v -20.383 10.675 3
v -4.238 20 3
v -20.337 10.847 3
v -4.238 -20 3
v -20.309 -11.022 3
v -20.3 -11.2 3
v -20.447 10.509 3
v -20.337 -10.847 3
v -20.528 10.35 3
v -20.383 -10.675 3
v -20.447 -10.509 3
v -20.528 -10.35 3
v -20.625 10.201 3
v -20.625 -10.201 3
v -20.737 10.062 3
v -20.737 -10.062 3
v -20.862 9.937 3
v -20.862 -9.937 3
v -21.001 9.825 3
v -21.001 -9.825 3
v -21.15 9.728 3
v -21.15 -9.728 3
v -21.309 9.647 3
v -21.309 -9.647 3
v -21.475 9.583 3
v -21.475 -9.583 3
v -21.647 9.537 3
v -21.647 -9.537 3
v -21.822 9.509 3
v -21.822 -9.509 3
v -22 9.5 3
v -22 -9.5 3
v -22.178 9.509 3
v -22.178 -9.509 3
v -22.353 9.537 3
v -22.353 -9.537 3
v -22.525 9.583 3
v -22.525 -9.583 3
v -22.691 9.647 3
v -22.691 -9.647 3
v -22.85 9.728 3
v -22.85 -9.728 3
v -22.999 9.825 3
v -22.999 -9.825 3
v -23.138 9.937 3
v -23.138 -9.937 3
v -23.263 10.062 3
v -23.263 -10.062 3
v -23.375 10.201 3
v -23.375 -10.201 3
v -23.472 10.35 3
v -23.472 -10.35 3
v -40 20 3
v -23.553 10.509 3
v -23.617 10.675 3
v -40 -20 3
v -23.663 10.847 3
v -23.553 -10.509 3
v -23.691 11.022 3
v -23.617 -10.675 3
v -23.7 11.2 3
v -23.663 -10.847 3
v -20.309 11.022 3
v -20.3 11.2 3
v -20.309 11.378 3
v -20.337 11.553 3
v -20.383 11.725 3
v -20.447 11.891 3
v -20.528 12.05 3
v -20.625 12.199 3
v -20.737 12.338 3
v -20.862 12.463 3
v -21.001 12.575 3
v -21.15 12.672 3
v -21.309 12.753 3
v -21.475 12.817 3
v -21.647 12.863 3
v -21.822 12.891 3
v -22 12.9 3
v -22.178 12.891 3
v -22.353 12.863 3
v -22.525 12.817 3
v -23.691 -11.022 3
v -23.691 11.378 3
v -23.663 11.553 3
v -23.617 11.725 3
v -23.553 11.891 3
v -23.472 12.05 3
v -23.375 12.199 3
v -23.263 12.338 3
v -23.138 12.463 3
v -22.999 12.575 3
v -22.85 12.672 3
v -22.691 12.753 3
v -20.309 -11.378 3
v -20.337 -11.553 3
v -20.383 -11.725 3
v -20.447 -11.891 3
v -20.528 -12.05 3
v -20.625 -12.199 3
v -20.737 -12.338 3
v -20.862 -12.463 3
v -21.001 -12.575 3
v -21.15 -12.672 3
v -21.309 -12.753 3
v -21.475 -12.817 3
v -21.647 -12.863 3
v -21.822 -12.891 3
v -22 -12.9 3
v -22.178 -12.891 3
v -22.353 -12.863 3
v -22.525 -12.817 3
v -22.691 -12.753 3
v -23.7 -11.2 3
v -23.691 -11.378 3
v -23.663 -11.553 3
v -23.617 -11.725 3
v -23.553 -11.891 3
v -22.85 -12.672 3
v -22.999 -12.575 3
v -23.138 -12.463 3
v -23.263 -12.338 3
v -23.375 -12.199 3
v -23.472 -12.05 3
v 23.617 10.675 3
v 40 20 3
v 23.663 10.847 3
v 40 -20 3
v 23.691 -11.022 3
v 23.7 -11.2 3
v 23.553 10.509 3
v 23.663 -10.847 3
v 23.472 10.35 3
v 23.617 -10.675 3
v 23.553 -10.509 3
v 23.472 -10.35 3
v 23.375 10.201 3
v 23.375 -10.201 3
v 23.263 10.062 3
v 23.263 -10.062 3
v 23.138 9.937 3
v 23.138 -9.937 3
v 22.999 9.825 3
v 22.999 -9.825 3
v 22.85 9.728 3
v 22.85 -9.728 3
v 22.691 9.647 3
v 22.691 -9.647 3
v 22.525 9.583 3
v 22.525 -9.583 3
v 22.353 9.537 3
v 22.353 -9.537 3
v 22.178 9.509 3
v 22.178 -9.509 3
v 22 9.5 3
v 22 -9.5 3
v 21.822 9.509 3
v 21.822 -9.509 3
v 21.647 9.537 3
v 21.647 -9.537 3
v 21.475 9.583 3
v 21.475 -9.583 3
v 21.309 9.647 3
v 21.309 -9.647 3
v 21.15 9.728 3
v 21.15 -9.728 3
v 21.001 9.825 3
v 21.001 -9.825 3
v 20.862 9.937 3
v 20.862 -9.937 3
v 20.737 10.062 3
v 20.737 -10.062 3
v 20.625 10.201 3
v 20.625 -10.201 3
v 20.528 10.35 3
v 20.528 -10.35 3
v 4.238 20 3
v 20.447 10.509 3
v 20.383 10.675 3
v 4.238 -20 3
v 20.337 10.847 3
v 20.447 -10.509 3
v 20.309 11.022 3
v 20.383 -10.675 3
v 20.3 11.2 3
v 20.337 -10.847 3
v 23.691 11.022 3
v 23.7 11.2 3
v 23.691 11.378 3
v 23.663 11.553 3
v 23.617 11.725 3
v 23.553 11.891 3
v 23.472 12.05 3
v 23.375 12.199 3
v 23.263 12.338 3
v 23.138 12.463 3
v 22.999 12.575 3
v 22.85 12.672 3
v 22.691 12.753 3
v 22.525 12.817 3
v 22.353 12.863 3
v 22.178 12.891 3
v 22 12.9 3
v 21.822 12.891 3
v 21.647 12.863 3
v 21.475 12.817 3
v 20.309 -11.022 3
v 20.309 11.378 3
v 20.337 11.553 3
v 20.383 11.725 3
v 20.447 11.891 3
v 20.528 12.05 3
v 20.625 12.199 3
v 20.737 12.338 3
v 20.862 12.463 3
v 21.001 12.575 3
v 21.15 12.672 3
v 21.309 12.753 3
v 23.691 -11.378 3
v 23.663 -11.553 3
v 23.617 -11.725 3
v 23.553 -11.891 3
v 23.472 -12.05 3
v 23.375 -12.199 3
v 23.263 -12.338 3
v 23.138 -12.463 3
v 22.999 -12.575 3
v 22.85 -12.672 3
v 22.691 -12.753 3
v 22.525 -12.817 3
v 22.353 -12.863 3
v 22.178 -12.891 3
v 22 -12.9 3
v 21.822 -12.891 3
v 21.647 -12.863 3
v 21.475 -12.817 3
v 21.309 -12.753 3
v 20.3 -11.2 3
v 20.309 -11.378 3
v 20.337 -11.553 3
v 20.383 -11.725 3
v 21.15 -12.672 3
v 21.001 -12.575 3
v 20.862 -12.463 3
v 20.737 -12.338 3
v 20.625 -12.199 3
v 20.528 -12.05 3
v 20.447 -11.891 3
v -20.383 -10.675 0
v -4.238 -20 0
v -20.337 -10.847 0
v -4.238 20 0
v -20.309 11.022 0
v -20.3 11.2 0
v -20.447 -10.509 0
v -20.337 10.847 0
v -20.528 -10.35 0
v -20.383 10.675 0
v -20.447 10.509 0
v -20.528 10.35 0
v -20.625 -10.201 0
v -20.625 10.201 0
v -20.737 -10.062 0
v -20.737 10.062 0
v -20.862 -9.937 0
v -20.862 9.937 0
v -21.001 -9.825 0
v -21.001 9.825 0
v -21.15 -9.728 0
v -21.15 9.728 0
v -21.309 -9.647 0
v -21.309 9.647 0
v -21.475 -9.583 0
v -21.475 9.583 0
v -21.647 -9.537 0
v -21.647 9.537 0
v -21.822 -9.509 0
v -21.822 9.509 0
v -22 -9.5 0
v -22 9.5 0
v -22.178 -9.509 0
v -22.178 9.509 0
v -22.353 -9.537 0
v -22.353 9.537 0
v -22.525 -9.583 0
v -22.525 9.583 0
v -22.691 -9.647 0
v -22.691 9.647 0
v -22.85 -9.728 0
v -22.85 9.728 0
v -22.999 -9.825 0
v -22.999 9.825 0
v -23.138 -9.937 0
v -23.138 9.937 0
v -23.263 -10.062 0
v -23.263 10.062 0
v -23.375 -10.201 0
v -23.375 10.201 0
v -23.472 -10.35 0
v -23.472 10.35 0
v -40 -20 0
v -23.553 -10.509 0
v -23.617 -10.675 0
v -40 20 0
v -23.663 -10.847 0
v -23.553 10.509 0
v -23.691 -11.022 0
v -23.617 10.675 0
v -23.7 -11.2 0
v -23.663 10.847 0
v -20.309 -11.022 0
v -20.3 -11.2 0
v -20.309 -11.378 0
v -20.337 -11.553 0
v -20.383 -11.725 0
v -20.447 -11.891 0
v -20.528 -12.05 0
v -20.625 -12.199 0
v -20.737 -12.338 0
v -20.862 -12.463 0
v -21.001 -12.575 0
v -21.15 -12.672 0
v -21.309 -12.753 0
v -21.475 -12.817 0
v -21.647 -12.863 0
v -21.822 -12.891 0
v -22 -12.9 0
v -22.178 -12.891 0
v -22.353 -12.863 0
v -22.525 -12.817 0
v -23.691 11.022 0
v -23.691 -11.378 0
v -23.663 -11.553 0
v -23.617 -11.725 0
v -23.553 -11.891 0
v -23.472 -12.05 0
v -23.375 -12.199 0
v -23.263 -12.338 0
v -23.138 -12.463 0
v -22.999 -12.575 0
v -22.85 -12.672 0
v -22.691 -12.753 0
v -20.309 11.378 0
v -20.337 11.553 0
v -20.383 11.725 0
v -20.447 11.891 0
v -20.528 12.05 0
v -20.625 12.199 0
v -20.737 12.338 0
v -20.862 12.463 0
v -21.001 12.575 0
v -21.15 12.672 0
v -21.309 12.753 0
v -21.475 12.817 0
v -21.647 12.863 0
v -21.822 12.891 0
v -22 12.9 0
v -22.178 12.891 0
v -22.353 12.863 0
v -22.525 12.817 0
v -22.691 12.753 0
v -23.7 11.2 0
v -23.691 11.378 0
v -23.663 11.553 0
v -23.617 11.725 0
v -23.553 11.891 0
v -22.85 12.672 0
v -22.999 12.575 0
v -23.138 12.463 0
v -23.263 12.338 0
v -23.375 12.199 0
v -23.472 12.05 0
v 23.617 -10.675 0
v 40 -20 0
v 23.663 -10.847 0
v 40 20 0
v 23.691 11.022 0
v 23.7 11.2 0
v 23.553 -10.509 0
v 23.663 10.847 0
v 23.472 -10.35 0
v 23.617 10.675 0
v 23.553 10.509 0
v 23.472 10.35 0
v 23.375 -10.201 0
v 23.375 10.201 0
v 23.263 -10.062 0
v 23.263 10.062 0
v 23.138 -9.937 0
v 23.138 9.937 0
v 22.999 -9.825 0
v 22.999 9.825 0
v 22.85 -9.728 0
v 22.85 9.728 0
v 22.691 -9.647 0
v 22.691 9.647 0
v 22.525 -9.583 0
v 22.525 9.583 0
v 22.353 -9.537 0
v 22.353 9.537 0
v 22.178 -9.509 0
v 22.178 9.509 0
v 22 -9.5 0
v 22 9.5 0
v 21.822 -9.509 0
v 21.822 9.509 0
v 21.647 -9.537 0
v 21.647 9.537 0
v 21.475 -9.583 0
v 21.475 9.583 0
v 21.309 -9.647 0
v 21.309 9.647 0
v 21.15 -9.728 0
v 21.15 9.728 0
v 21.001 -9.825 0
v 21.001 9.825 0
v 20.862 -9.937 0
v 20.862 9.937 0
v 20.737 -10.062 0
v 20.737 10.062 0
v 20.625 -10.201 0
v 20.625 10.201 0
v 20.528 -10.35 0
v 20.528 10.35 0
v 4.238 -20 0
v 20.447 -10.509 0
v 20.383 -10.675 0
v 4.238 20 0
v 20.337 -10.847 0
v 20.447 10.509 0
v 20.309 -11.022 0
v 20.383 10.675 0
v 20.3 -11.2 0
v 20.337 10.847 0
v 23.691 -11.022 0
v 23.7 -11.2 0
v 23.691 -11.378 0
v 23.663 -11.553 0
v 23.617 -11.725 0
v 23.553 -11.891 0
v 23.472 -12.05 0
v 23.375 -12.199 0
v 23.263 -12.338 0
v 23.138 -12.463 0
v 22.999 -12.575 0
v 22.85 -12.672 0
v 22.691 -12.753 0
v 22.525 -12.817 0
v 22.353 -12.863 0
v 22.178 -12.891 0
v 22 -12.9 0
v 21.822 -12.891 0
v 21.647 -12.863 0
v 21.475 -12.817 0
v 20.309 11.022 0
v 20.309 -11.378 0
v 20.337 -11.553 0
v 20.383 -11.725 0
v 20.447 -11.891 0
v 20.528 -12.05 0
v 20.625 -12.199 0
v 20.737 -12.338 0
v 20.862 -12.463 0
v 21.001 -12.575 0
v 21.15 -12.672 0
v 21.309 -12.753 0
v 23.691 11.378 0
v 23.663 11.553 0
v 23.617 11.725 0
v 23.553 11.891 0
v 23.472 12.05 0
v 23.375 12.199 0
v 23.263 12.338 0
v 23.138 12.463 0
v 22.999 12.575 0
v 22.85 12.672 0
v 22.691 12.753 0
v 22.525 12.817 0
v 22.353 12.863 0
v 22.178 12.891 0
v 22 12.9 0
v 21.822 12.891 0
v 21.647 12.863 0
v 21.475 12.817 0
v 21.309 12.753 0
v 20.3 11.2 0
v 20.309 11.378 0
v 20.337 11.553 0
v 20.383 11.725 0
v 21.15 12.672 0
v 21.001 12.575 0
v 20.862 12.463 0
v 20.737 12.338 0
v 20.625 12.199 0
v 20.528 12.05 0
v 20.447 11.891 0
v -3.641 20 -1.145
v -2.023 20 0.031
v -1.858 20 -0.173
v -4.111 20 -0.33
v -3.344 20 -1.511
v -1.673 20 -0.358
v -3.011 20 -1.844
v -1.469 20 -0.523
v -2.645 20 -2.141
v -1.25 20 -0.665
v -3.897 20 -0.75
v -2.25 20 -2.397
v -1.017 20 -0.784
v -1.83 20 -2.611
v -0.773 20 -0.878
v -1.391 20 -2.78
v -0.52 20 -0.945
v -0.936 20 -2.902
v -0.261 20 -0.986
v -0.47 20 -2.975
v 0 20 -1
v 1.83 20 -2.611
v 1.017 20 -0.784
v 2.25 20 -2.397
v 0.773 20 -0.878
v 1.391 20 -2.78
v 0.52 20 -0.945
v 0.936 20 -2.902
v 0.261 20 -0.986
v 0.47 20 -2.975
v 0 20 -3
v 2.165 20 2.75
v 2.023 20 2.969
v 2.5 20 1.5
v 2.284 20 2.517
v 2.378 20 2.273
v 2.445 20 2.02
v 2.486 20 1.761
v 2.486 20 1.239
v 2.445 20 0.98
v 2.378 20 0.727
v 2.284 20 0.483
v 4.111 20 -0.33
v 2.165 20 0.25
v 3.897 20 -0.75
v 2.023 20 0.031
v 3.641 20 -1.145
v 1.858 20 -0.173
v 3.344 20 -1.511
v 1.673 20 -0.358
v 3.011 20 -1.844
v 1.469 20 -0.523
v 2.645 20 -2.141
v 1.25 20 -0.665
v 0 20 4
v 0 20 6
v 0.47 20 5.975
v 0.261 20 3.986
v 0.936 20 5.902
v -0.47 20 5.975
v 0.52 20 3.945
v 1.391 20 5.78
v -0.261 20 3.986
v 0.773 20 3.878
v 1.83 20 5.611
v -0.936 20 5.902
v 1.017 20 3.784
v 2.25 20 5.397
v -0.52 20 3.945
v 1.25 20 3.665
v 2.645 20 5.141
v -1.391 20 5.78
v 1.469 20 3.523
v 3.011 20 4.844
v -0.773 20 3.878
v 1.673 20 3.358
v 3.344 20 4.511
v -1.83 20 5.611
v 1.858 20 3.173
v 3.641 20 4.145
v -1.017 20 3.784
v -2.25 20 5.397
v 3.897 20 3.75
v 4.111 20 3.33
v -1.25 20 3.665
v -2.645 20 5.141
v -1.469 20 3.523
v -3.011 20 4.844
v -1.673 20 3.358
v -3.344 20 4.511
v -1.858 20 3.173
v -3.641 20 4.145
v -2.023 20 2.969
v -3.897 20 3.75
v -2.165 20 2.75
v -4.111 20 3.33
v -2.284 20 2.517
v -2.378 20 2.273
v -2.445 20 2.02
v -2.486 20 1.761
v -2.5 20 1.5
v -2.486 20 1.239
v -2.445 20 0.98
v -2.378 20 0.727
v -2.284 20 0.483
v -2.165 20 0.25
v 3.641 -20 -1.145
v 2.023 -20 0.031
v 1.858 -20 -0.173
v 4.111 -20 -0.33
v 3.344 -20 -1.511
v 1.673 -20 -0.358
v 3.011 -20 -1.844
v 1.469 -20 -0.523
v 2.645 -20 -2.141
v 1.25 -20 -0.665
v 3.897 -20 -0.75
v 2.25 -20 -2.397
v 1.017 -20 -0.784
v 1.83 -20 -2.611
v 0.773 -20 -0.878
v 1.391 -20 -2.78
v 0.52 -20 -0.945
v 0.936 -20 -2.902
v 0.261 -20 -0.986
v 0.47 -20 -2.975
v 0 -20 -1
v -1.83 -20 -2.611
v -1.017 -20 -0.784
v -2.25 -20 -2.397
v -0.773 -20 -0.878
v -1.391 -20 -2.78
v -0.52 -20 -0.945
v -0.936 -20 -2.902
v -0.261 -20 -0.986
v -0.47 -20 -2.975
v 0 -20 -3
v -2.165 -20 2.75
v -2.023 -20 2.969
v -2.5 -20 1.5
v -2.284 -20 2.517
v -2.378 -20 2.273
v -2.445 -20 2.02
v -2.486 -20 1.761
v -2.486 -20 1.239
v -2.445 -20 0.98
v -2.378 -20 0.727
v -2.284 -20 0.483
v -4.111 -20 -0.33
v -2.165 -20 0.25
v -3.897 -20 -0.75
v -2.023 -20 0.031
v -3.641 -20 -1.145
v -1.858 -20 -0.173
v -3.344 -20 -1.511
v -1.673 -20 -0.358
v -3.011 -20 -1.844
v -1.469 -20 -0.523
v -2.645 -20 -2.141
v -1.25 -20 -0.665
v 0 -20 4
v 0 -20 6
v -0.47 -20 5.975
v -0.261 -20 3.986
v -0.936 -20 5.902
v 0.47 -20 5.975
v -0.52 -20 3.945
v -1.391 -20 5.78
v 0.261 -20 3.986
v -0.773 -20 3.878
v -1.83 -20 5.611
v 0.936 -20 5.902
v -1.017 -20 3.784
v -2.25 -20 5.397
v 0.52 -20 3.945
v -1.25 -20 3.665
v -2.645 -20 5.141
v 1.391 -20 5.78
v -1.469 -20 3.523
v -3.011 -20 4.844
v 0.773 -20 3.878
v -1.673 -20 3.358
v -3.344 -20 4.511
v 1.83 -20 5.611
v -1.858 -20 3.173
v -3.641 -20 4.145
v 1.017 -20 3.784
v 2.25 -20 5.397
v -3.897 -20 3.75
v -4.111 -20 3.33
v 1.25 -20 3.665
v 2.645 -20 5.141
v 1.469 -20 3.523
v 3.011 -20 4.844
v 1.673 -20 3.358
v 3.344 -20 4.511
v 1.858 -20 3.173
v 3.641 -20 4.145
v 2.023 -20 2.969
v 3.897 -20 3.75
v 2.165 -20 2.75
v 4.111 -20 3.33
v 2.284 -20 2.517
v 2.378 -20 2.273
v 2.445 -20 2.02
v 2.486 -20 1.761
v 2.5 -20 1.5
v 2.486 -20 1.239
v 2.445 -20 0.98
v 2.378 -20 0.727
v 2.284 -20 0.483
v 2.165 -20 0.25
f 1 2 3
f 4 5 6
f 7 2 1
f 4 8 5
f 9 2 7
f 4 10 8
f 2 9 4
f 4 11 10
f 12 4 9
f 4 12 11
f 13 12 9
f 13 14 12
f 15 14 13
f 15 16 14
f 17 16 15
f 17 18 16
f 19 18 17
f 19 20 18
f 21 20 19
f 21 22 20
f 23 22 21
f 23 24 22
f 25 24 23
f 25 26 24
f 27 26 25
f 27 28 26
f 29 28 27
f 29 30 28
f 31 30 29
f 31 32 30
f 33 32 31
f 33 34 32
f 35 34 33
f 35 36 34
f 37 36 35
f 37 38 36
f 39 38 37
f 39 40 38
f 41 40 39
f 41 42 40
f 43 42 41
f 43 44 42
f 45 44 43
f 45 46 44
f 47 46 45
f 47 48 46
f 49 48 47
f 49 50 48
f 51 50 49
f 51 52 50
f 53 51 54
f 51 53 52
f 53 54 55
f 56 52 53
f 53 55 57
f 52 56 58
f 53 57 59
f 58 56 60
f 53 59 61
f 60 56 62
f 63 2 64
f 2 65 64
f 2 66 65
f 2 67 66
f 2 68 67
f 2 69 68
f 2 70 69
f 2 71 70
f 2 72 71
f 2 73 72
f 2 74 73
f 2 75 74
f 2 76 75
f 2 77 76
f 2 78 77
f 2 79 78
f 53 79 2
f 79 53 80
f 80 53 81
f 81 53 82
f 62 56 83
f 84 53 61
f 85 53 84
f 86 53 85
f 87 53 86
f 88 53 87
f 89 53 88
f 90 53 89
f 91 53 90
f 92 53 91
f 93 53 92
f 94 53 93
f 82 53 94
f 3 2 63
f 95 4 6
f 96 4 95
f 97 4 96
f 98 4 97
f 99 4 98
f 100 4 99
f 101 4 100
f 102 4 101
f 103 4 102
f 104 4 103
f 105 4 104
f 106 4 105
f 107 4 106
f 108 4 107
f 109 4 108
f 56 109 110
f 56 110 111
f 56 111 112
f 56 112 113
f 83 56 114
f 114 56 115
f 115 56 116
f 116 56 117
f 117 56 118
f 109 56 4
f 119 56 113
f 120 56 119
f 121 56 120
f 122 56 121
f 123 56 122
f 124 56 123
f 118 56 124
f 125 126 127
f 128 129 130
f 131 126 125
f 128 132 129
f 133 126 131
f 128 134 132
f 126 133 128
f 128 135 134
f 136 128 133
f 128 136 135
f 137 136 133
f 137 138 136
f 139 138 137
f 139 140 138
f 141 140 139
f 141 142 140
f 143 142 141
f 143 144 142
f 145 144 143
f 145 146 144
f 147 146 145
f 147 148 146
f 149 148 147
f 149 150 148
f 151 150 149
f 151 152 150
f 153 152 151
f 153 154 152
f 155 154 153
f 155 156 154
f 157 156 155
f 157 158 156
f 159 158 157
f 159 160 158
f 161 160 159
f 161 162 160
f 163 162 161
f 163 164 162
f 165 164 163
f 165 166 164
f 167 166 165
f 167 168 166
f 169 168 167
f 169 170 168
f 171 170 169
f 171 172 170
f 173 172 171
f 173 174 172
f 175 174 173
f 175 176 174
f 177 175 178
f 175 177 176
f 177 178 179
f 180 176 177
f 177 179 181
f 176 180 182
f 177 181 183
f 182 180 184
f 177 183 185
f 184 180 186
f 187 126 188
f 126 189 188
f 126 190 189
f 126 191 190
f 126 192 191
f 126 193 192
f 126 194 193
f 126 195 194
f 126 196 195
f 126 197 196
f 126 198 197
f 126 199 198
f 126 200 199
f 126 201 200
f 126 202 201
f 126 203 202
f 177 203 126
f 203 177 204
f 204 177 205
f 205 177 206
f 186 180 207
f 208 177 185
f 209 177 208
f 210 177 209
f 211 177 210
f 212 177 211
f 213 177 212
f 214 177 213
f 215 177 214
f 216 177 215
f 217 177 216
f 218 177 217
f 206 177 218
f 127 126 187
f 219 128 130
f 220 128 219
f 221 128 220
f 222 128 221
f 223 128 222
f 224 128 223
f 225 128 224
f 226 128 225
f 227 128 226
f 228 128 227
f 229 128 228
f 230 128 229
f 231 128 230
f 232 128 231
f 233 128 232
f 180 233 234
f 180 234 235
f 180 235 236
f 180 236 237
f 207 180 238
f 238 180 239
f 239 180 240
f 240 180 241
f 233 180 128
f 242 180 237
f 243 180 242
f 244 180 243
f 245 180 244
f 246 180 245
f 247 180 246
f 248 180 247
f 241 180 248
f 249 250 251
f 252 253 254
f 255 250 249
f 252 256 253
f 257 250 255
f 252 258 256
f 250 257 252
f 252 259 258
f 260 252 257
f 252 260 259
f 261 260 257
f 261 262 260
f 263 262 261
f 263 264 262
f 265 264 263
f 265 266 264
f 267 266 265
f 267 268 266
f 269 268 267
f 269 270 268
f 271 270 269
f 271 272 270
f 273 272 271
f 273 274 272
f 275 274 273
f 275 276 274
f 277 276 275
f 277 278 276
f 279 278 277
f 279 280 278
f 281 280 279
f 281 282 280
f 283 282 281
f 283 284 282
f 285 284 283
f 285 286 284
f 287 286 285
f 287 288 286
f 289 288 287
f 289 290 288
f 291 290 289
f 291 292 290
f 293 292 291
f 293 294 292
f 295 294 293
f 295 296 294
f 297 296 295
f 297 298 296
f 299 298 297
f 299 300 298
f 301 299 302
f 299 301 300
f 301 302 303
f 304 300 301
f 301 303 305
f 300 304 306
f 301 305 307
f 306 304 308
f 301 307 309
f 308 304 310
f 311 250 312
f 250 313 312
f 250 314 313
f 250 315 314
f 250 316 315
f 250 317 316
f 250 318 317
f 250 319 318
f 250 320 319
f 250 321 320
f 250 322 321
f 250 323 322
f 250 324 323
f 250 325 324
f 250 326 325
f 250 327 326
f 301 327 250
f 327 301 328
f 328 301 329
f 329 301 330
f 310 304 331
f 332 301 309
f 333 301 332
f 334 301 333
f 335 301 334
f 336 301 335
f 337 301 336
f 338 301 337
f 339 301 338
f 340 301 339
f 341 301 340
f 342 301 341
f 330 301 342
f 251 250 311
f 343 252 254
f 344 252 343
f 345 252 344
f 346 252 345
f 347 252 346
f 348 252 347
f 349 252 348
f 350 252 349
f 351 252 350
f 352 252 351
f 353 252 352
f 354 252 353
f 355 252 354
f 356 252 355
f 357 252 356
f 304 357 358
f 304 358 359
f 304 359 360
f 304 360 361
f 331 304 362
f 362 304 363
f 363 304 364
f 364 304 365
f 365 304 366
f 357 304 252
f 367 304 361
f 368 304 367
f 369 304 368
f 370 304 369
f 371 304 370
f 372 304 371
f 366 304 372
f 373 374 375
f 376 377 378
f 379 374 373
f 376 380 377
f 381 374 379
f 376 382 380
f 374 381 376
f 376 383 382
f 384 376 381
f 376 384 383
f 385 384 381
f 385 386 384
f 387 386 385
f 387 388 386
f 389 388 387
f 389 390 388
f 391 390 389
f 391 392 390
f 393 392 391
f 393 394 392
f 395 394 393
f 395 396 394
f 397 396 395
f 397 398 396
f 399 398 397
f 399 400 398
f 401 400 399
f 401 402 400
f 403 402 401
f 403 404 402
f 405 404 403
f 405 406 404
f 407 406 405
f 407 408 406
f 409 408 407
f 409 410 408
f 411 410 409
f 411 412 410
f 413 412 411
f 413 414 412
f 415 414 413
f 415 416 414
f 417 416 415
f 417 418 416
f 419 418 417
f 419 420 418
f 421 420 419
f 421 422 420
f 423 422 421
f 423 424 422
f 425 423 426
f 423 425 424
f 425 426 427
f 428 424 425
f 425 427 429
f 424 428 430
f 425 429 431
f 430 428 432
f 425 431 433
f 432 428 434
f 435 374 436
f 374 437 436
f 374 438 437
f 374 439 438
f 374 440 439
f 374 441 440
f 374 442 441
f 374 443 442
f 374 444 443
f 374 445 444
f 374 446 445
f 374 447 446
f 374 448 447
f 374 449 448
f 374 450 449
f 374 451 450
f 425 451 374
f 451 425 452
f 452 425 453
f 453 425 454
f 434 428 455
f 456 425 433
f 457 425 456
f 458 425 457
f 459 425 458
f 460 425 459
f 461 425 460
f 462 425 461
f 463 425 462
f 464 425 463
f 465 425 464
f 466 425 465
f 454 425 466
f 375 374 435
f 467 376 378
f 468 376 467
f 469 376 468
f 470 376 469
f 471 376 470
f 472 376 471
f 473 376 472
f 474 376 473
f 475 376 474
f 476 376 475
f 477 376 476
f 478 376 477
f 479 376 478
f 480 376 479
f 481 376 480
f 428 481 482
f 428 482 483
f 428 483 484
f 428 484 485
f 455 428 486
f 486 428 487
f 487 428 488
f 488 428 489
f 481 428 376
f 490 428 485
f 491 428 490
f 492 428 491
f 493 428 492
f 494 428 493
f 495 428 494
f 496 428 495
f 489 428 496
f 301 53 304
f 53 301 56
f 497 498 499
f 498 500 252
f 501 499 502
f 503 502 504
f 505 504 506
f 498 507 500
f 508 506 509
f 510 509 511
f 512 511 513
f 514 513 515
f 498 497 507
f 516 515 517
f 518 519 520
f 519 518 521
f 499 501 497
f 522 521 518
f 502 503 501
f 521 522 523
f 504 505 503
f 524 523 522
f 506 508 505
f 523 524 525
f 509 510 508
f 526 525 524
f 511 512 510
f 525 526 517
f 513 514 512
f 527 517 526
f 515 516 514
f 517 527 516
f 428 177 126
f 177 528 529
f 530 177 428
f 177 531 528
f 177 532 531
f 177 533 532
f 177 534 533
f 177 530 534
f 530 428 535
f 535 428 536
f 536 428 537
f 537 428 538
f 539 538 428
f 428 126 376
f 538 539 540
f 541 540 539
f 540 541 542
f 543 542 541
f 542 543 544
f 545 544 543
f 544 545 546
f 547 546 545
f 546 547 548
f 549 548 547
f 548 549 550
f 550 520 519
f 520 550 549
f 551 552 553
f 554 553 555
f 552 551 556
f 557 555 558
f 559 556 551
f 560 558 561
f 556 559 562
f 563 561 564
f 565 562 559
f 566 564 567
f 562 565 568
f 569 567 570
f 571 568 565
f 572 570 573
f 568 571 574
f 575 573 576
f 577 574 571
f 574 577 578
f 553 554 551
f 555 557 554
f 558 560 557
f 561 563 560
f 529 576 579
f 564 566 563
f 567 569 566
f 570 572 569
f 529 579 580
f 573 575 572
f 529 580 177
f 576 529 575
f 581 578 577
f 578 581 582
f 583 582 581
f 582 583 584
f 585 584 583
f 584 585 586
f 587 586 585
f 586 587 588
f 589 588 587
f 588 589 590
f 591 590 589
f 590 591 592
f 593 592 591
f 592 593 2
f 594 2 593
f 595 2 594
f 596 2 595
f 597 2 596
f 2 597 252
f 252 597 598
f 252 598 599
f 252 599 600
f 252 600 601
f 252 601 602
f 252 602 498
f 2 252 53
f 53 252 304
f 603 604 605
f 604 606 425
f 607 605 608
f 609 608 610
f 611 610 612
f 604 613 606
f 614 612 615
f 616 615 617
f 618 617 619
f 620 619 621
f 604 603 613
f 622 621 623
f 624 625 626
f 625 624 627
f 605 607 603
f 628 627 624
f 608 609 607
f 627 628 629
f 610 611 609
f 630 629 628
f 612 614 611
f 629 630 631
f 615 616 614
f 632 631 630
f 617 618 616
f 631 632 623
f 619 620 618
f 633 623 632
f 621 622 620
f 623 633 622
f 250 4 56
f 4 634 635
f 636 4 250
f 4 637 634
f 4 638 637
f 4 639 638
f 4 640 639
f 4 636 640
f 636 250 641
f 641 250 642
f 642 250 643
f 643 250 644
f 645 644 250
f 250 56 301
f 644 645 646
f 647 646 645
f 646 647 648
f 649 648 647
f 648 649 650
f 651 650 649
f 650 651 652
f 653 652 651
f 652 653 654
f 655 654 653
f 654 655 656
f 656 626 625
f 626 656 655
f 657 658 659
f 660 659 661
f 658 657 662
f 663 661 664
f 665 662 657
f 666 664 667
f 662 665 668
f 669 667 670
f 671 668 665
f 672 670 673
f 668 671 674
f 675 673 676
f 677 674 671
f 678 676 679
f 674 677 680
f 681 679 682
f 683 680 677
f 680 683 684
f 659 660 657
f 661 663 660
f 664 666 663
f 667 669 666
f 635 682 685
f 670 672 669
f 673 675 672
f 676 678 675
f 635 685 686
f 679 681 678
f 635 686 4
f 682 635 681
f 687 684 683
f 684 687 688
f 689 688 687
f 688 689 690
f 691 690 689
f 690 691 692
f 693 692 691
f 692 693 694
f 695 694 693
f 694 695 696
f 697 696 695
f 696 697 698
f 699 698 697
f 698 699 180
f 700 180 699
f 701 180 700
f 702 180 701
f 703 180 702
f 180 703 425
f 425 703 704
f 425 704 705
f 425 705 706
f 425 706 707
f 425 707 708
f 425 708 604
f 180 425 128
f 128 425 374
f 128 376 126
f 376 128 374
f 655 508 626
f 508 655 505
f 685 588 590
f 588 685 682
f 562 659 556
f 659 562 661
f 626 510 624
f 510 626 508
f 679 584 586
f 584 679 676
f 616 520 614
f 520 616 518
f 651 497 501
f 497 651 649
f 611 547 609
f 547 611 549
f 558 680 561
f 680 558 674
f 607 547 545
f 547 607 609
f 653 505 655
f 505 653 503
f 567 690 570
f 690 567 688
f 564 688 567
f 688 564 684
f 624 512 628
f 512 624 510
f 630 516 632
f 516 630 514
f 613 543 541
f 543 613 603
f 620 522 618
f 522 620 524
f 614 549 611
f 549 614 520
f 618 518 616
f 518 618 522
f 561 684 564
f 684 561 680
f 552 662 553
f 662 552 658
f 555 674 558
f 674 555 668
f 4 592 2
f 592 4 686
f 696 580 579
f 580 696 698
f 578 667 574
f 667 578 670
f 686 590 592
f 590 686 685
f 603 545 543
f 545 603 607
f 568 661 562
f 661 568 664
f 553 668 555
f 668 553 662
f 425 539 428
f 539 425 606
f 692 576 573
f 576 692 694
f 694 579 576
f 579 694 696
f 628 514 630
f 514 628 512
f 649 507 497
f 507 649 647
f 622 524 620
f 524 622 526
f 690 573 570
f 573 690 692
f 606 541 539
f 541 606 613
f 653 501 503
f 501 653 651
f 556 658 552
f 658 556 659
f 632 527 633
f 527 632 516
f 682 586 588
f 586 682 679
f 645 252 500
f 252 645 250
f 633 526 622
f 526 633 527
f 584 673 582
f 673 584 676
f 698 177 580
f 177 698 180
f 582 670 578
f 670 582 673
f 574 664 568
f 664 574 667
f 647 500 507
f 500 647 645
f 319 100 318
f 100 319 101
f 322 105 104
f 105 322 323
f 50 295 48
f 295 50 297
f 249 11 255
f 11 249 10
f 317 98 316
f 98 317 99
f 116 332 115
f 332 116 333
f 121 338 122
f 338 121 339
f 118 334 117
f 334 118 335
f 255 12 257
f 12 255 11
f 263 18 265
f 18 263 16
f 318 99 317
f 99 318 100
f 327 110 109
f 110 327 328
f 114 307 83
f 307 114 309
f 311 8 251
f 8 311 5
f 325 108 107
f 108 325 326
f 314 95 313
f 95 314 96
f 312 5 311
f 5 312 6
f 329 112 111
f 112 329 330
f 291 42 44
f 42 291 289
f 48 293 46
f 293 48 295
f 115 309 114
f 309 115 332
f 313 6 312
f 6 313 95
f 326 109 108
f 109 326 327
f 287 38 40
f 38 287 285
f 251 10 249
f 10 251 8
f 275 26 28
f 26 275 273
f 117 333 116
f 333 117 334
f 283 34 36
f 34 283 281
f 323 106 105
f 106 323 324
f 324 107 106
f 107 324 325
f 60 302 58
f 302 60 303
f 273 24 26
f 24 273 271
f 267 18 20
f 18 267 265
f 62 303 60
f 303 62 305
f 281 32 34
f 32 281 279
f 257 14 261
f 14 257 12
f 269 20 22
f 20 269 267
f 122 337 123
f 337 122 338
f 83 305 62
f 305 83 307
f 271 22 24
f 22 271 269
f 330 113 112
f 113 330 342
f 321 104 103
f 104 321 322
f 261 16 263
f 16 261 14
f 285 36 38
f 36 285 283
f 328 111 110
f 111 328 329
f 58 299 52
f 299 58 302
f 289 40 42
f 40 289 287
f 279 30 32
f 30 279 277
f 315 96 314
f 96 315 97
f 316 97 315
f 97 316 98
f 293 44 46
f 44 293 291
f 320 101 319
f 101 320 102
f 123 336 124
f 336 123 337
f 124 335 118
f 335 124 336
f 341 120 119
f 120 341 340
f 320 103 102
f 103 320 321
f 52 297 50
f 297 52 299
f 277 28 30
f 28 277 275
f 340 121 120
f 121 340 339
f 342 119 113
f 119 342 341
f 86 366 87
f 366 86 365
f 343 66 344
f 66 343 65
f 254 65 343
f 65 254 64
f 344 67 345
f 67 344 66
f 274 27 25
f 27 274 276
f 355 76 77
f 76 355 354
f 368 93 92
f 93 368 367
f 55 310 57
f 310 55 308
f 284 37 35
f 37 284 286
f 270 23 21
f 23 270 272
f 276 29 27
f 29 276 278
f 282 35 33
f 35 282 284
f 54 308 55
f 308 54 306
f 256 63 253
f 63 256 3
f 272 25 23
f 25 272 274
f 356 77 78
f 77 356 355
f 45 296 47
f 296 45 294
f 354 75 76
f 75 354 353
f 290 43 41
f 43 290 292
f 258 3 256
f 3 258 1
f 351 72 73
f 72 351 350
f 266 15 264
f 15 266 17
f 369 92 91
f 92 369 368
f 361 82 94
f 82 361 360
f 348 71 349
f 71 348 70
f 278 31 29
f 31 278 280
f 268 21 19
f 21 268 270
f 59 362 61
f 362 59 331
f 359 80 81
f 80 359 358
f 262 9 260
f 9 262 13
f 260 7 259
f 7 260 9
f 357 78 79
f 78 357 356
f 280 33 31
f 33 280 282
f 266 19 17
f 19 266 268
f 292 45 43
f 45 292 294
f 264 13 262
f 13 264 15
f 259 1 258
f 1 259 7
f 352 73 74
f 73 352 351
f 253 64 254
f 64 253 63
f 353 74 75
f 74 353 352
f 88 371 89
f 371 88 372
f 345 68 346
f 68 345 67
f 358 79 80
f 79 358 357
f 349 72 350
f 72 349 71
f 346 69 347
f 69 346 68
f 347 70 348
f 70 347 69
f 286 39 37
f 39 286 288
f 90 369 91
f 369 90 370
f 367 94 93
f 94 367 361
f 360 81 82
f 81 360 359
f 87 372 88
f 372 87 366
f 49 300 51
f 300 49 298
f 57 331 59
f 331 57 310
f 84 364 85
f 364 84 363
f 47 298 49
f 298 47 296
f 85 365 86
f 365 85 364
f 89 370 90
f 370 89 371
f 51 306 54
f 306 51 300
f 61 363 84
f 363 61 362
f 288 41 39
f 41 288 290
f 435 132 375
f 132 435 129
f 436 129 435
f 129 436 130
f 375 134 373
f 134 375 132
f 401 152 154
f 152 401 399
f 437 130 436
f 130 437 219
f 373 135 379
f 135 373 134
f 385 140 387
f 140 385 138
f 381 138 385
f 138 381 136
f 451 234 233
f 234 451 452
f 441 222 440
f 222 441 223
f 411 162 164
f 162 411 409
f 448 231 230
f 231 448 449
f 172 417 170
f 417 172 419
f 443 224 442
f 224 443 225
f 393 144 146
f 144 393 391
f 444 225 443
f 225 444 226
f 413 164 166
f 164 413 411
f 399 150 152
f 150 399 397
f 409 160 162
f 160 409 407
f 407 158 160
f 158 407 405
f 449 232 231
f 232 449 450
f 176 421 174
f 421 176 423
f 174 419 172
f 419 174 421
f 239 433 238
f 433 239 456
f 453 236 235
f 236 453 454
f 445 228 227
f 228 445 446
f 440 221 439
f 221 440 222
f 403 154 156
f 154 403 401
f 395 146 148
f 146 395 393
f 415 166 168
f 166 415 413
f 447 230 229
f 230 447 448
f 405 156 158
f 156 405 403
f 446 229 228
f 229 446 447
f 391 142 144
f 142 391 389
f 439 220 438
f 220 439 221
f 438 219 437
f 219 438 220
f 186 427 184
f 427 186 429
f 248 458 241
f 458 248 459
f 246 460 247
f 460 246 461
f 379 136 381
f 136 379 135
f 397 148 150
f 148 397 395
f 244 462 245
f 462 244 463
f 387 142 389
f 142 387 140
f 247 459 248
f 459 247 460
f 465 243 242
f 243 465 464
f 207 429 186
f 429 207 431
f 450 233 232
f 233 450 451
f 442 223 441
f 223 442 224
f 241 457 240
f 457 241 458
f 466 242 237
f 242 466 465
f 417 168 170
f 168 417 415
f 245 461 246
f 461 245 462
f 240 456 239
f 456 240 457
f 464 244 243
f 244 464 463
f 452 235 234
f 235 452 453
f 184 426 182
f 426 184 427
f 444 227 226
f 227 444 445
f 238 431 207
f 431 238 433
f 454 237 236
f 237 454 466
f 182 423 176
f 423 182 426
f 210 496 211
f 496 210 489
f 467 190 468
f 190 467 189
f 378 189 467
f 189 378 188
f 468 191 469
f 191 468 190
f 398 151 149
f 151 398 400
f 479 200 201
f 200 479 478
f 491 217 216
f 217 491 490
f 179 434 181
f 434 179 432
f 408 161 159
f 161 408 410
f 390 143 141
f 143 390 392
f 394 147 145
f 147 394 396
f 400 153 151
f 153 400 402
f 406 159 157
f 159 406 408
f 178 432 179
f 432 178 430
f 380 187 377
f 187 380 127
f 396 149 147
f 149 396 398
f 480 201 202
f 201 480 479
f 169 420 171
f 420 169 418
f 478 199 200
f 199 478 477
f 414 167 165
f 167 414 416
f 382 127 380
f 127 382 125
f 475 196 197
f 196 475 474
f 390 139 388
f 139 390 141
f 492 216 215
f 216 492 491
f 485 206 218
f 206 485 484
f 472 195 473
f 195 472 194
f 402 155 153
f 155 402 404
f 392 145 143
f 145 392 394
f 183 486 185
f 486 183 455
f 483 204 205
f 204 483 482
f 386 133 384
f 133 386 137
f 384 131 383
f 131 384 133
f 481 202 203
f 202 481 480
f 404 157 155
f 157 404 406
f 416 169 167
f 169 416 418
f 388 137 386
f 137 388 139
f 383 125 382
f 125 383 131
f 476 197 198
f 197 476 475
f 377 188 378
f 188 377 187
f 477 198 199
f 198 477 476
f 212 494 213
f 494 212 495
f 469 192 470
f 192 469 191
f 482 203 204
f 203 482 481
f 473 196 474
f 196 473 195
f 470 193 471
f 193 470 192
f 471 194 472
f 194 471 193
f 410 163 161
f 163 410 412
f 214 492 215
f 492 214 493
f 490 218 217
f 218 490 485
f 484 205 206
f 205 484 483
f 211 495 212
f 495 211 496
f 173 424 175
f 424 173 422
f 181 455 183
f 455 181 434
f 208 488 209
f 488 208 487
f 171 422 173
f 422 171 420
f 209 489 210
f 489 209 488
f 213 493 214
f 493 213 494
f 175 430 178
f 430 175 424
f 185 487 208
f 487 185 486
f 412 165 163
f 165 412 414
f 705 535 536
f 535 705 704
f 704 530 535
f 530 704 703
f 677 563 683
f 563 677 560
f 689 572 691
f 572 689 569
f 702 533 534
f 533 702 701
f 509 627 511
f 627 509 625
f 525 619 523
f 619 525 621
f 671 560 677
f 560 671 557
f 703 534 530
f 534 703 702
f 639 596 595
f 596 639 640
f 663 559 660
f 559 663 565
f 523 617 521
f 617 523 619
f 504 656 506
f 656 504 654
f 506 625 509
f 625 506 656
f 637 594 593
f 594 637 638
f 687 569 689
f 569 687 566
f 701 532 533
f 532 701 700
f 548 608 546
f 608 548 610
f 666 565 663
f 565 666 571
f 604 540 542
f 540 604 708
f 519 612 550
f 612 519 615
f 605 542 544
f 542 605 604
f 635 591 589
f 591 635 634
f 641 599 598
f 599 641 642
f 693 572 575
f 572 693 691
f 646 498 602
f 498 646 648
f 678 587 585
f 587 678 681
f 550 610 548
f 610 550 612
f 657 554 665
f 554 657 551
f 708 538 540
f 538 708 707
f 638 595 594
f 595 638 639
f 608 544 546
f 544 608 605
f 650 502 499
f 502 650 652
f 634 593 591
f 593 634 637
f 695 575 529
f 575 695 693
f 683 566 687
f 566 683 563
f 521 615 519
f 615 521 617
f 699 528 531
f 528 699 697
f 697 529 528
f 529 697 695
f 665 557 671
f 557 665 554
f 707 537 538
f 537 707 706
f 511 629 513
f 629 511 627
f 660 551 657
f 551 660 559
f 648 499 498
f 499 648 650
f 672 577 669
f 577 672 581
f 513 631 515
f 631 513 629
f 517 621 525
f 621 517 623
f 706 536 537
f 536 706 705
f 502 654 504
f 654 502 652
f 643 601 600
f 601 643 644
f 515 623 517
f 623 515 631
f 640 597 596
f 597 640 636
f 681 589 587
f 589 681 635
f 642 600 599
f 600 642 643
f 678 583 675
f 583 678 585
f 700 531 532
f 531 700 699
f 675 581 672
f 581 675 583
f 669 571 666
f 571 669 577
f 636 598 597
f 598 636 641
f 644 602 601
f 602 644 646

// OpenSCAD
// Two-leaf hinge with a printable straight pin barrel.
$fn = 60;
eps = 0.02;
leaf_l = 40;
leaf_w = 40;
leaf_t = 3;
pin_d = 5;
barrel_d = pin_d + 4;
difference() {
    union() {
        translate([-leaf_l, -leaf_w / 2, 0]) cube([leaf_l, leaf_w, leaf_t]);
        translate([0, -leaf_w / 2, 0]) cube([leaf_l, leaf_w, leaf_t]);
        translate([0, -leaf_w / 2, leaf_t / 2]) rotate([-90, 0, 0]) cylinder(d = barrel_d, h = leaf_w);
    }
    translate([0, -leaf_w / 2 - eps, leaf_t / 2]) rotate([-90, 0, 0]) cylinder(d = pin_d, h = leaf_w + 2 * eps);
    for (x = [-leaf_l * 0.55, leaf_l * 0.55], y = [-leaf_w * 0.28, leaf_w * 0.28])
        translate([x, y, -eps]) cylinder(d = 3.4, h = leaf_t + 2 * eps);
}
